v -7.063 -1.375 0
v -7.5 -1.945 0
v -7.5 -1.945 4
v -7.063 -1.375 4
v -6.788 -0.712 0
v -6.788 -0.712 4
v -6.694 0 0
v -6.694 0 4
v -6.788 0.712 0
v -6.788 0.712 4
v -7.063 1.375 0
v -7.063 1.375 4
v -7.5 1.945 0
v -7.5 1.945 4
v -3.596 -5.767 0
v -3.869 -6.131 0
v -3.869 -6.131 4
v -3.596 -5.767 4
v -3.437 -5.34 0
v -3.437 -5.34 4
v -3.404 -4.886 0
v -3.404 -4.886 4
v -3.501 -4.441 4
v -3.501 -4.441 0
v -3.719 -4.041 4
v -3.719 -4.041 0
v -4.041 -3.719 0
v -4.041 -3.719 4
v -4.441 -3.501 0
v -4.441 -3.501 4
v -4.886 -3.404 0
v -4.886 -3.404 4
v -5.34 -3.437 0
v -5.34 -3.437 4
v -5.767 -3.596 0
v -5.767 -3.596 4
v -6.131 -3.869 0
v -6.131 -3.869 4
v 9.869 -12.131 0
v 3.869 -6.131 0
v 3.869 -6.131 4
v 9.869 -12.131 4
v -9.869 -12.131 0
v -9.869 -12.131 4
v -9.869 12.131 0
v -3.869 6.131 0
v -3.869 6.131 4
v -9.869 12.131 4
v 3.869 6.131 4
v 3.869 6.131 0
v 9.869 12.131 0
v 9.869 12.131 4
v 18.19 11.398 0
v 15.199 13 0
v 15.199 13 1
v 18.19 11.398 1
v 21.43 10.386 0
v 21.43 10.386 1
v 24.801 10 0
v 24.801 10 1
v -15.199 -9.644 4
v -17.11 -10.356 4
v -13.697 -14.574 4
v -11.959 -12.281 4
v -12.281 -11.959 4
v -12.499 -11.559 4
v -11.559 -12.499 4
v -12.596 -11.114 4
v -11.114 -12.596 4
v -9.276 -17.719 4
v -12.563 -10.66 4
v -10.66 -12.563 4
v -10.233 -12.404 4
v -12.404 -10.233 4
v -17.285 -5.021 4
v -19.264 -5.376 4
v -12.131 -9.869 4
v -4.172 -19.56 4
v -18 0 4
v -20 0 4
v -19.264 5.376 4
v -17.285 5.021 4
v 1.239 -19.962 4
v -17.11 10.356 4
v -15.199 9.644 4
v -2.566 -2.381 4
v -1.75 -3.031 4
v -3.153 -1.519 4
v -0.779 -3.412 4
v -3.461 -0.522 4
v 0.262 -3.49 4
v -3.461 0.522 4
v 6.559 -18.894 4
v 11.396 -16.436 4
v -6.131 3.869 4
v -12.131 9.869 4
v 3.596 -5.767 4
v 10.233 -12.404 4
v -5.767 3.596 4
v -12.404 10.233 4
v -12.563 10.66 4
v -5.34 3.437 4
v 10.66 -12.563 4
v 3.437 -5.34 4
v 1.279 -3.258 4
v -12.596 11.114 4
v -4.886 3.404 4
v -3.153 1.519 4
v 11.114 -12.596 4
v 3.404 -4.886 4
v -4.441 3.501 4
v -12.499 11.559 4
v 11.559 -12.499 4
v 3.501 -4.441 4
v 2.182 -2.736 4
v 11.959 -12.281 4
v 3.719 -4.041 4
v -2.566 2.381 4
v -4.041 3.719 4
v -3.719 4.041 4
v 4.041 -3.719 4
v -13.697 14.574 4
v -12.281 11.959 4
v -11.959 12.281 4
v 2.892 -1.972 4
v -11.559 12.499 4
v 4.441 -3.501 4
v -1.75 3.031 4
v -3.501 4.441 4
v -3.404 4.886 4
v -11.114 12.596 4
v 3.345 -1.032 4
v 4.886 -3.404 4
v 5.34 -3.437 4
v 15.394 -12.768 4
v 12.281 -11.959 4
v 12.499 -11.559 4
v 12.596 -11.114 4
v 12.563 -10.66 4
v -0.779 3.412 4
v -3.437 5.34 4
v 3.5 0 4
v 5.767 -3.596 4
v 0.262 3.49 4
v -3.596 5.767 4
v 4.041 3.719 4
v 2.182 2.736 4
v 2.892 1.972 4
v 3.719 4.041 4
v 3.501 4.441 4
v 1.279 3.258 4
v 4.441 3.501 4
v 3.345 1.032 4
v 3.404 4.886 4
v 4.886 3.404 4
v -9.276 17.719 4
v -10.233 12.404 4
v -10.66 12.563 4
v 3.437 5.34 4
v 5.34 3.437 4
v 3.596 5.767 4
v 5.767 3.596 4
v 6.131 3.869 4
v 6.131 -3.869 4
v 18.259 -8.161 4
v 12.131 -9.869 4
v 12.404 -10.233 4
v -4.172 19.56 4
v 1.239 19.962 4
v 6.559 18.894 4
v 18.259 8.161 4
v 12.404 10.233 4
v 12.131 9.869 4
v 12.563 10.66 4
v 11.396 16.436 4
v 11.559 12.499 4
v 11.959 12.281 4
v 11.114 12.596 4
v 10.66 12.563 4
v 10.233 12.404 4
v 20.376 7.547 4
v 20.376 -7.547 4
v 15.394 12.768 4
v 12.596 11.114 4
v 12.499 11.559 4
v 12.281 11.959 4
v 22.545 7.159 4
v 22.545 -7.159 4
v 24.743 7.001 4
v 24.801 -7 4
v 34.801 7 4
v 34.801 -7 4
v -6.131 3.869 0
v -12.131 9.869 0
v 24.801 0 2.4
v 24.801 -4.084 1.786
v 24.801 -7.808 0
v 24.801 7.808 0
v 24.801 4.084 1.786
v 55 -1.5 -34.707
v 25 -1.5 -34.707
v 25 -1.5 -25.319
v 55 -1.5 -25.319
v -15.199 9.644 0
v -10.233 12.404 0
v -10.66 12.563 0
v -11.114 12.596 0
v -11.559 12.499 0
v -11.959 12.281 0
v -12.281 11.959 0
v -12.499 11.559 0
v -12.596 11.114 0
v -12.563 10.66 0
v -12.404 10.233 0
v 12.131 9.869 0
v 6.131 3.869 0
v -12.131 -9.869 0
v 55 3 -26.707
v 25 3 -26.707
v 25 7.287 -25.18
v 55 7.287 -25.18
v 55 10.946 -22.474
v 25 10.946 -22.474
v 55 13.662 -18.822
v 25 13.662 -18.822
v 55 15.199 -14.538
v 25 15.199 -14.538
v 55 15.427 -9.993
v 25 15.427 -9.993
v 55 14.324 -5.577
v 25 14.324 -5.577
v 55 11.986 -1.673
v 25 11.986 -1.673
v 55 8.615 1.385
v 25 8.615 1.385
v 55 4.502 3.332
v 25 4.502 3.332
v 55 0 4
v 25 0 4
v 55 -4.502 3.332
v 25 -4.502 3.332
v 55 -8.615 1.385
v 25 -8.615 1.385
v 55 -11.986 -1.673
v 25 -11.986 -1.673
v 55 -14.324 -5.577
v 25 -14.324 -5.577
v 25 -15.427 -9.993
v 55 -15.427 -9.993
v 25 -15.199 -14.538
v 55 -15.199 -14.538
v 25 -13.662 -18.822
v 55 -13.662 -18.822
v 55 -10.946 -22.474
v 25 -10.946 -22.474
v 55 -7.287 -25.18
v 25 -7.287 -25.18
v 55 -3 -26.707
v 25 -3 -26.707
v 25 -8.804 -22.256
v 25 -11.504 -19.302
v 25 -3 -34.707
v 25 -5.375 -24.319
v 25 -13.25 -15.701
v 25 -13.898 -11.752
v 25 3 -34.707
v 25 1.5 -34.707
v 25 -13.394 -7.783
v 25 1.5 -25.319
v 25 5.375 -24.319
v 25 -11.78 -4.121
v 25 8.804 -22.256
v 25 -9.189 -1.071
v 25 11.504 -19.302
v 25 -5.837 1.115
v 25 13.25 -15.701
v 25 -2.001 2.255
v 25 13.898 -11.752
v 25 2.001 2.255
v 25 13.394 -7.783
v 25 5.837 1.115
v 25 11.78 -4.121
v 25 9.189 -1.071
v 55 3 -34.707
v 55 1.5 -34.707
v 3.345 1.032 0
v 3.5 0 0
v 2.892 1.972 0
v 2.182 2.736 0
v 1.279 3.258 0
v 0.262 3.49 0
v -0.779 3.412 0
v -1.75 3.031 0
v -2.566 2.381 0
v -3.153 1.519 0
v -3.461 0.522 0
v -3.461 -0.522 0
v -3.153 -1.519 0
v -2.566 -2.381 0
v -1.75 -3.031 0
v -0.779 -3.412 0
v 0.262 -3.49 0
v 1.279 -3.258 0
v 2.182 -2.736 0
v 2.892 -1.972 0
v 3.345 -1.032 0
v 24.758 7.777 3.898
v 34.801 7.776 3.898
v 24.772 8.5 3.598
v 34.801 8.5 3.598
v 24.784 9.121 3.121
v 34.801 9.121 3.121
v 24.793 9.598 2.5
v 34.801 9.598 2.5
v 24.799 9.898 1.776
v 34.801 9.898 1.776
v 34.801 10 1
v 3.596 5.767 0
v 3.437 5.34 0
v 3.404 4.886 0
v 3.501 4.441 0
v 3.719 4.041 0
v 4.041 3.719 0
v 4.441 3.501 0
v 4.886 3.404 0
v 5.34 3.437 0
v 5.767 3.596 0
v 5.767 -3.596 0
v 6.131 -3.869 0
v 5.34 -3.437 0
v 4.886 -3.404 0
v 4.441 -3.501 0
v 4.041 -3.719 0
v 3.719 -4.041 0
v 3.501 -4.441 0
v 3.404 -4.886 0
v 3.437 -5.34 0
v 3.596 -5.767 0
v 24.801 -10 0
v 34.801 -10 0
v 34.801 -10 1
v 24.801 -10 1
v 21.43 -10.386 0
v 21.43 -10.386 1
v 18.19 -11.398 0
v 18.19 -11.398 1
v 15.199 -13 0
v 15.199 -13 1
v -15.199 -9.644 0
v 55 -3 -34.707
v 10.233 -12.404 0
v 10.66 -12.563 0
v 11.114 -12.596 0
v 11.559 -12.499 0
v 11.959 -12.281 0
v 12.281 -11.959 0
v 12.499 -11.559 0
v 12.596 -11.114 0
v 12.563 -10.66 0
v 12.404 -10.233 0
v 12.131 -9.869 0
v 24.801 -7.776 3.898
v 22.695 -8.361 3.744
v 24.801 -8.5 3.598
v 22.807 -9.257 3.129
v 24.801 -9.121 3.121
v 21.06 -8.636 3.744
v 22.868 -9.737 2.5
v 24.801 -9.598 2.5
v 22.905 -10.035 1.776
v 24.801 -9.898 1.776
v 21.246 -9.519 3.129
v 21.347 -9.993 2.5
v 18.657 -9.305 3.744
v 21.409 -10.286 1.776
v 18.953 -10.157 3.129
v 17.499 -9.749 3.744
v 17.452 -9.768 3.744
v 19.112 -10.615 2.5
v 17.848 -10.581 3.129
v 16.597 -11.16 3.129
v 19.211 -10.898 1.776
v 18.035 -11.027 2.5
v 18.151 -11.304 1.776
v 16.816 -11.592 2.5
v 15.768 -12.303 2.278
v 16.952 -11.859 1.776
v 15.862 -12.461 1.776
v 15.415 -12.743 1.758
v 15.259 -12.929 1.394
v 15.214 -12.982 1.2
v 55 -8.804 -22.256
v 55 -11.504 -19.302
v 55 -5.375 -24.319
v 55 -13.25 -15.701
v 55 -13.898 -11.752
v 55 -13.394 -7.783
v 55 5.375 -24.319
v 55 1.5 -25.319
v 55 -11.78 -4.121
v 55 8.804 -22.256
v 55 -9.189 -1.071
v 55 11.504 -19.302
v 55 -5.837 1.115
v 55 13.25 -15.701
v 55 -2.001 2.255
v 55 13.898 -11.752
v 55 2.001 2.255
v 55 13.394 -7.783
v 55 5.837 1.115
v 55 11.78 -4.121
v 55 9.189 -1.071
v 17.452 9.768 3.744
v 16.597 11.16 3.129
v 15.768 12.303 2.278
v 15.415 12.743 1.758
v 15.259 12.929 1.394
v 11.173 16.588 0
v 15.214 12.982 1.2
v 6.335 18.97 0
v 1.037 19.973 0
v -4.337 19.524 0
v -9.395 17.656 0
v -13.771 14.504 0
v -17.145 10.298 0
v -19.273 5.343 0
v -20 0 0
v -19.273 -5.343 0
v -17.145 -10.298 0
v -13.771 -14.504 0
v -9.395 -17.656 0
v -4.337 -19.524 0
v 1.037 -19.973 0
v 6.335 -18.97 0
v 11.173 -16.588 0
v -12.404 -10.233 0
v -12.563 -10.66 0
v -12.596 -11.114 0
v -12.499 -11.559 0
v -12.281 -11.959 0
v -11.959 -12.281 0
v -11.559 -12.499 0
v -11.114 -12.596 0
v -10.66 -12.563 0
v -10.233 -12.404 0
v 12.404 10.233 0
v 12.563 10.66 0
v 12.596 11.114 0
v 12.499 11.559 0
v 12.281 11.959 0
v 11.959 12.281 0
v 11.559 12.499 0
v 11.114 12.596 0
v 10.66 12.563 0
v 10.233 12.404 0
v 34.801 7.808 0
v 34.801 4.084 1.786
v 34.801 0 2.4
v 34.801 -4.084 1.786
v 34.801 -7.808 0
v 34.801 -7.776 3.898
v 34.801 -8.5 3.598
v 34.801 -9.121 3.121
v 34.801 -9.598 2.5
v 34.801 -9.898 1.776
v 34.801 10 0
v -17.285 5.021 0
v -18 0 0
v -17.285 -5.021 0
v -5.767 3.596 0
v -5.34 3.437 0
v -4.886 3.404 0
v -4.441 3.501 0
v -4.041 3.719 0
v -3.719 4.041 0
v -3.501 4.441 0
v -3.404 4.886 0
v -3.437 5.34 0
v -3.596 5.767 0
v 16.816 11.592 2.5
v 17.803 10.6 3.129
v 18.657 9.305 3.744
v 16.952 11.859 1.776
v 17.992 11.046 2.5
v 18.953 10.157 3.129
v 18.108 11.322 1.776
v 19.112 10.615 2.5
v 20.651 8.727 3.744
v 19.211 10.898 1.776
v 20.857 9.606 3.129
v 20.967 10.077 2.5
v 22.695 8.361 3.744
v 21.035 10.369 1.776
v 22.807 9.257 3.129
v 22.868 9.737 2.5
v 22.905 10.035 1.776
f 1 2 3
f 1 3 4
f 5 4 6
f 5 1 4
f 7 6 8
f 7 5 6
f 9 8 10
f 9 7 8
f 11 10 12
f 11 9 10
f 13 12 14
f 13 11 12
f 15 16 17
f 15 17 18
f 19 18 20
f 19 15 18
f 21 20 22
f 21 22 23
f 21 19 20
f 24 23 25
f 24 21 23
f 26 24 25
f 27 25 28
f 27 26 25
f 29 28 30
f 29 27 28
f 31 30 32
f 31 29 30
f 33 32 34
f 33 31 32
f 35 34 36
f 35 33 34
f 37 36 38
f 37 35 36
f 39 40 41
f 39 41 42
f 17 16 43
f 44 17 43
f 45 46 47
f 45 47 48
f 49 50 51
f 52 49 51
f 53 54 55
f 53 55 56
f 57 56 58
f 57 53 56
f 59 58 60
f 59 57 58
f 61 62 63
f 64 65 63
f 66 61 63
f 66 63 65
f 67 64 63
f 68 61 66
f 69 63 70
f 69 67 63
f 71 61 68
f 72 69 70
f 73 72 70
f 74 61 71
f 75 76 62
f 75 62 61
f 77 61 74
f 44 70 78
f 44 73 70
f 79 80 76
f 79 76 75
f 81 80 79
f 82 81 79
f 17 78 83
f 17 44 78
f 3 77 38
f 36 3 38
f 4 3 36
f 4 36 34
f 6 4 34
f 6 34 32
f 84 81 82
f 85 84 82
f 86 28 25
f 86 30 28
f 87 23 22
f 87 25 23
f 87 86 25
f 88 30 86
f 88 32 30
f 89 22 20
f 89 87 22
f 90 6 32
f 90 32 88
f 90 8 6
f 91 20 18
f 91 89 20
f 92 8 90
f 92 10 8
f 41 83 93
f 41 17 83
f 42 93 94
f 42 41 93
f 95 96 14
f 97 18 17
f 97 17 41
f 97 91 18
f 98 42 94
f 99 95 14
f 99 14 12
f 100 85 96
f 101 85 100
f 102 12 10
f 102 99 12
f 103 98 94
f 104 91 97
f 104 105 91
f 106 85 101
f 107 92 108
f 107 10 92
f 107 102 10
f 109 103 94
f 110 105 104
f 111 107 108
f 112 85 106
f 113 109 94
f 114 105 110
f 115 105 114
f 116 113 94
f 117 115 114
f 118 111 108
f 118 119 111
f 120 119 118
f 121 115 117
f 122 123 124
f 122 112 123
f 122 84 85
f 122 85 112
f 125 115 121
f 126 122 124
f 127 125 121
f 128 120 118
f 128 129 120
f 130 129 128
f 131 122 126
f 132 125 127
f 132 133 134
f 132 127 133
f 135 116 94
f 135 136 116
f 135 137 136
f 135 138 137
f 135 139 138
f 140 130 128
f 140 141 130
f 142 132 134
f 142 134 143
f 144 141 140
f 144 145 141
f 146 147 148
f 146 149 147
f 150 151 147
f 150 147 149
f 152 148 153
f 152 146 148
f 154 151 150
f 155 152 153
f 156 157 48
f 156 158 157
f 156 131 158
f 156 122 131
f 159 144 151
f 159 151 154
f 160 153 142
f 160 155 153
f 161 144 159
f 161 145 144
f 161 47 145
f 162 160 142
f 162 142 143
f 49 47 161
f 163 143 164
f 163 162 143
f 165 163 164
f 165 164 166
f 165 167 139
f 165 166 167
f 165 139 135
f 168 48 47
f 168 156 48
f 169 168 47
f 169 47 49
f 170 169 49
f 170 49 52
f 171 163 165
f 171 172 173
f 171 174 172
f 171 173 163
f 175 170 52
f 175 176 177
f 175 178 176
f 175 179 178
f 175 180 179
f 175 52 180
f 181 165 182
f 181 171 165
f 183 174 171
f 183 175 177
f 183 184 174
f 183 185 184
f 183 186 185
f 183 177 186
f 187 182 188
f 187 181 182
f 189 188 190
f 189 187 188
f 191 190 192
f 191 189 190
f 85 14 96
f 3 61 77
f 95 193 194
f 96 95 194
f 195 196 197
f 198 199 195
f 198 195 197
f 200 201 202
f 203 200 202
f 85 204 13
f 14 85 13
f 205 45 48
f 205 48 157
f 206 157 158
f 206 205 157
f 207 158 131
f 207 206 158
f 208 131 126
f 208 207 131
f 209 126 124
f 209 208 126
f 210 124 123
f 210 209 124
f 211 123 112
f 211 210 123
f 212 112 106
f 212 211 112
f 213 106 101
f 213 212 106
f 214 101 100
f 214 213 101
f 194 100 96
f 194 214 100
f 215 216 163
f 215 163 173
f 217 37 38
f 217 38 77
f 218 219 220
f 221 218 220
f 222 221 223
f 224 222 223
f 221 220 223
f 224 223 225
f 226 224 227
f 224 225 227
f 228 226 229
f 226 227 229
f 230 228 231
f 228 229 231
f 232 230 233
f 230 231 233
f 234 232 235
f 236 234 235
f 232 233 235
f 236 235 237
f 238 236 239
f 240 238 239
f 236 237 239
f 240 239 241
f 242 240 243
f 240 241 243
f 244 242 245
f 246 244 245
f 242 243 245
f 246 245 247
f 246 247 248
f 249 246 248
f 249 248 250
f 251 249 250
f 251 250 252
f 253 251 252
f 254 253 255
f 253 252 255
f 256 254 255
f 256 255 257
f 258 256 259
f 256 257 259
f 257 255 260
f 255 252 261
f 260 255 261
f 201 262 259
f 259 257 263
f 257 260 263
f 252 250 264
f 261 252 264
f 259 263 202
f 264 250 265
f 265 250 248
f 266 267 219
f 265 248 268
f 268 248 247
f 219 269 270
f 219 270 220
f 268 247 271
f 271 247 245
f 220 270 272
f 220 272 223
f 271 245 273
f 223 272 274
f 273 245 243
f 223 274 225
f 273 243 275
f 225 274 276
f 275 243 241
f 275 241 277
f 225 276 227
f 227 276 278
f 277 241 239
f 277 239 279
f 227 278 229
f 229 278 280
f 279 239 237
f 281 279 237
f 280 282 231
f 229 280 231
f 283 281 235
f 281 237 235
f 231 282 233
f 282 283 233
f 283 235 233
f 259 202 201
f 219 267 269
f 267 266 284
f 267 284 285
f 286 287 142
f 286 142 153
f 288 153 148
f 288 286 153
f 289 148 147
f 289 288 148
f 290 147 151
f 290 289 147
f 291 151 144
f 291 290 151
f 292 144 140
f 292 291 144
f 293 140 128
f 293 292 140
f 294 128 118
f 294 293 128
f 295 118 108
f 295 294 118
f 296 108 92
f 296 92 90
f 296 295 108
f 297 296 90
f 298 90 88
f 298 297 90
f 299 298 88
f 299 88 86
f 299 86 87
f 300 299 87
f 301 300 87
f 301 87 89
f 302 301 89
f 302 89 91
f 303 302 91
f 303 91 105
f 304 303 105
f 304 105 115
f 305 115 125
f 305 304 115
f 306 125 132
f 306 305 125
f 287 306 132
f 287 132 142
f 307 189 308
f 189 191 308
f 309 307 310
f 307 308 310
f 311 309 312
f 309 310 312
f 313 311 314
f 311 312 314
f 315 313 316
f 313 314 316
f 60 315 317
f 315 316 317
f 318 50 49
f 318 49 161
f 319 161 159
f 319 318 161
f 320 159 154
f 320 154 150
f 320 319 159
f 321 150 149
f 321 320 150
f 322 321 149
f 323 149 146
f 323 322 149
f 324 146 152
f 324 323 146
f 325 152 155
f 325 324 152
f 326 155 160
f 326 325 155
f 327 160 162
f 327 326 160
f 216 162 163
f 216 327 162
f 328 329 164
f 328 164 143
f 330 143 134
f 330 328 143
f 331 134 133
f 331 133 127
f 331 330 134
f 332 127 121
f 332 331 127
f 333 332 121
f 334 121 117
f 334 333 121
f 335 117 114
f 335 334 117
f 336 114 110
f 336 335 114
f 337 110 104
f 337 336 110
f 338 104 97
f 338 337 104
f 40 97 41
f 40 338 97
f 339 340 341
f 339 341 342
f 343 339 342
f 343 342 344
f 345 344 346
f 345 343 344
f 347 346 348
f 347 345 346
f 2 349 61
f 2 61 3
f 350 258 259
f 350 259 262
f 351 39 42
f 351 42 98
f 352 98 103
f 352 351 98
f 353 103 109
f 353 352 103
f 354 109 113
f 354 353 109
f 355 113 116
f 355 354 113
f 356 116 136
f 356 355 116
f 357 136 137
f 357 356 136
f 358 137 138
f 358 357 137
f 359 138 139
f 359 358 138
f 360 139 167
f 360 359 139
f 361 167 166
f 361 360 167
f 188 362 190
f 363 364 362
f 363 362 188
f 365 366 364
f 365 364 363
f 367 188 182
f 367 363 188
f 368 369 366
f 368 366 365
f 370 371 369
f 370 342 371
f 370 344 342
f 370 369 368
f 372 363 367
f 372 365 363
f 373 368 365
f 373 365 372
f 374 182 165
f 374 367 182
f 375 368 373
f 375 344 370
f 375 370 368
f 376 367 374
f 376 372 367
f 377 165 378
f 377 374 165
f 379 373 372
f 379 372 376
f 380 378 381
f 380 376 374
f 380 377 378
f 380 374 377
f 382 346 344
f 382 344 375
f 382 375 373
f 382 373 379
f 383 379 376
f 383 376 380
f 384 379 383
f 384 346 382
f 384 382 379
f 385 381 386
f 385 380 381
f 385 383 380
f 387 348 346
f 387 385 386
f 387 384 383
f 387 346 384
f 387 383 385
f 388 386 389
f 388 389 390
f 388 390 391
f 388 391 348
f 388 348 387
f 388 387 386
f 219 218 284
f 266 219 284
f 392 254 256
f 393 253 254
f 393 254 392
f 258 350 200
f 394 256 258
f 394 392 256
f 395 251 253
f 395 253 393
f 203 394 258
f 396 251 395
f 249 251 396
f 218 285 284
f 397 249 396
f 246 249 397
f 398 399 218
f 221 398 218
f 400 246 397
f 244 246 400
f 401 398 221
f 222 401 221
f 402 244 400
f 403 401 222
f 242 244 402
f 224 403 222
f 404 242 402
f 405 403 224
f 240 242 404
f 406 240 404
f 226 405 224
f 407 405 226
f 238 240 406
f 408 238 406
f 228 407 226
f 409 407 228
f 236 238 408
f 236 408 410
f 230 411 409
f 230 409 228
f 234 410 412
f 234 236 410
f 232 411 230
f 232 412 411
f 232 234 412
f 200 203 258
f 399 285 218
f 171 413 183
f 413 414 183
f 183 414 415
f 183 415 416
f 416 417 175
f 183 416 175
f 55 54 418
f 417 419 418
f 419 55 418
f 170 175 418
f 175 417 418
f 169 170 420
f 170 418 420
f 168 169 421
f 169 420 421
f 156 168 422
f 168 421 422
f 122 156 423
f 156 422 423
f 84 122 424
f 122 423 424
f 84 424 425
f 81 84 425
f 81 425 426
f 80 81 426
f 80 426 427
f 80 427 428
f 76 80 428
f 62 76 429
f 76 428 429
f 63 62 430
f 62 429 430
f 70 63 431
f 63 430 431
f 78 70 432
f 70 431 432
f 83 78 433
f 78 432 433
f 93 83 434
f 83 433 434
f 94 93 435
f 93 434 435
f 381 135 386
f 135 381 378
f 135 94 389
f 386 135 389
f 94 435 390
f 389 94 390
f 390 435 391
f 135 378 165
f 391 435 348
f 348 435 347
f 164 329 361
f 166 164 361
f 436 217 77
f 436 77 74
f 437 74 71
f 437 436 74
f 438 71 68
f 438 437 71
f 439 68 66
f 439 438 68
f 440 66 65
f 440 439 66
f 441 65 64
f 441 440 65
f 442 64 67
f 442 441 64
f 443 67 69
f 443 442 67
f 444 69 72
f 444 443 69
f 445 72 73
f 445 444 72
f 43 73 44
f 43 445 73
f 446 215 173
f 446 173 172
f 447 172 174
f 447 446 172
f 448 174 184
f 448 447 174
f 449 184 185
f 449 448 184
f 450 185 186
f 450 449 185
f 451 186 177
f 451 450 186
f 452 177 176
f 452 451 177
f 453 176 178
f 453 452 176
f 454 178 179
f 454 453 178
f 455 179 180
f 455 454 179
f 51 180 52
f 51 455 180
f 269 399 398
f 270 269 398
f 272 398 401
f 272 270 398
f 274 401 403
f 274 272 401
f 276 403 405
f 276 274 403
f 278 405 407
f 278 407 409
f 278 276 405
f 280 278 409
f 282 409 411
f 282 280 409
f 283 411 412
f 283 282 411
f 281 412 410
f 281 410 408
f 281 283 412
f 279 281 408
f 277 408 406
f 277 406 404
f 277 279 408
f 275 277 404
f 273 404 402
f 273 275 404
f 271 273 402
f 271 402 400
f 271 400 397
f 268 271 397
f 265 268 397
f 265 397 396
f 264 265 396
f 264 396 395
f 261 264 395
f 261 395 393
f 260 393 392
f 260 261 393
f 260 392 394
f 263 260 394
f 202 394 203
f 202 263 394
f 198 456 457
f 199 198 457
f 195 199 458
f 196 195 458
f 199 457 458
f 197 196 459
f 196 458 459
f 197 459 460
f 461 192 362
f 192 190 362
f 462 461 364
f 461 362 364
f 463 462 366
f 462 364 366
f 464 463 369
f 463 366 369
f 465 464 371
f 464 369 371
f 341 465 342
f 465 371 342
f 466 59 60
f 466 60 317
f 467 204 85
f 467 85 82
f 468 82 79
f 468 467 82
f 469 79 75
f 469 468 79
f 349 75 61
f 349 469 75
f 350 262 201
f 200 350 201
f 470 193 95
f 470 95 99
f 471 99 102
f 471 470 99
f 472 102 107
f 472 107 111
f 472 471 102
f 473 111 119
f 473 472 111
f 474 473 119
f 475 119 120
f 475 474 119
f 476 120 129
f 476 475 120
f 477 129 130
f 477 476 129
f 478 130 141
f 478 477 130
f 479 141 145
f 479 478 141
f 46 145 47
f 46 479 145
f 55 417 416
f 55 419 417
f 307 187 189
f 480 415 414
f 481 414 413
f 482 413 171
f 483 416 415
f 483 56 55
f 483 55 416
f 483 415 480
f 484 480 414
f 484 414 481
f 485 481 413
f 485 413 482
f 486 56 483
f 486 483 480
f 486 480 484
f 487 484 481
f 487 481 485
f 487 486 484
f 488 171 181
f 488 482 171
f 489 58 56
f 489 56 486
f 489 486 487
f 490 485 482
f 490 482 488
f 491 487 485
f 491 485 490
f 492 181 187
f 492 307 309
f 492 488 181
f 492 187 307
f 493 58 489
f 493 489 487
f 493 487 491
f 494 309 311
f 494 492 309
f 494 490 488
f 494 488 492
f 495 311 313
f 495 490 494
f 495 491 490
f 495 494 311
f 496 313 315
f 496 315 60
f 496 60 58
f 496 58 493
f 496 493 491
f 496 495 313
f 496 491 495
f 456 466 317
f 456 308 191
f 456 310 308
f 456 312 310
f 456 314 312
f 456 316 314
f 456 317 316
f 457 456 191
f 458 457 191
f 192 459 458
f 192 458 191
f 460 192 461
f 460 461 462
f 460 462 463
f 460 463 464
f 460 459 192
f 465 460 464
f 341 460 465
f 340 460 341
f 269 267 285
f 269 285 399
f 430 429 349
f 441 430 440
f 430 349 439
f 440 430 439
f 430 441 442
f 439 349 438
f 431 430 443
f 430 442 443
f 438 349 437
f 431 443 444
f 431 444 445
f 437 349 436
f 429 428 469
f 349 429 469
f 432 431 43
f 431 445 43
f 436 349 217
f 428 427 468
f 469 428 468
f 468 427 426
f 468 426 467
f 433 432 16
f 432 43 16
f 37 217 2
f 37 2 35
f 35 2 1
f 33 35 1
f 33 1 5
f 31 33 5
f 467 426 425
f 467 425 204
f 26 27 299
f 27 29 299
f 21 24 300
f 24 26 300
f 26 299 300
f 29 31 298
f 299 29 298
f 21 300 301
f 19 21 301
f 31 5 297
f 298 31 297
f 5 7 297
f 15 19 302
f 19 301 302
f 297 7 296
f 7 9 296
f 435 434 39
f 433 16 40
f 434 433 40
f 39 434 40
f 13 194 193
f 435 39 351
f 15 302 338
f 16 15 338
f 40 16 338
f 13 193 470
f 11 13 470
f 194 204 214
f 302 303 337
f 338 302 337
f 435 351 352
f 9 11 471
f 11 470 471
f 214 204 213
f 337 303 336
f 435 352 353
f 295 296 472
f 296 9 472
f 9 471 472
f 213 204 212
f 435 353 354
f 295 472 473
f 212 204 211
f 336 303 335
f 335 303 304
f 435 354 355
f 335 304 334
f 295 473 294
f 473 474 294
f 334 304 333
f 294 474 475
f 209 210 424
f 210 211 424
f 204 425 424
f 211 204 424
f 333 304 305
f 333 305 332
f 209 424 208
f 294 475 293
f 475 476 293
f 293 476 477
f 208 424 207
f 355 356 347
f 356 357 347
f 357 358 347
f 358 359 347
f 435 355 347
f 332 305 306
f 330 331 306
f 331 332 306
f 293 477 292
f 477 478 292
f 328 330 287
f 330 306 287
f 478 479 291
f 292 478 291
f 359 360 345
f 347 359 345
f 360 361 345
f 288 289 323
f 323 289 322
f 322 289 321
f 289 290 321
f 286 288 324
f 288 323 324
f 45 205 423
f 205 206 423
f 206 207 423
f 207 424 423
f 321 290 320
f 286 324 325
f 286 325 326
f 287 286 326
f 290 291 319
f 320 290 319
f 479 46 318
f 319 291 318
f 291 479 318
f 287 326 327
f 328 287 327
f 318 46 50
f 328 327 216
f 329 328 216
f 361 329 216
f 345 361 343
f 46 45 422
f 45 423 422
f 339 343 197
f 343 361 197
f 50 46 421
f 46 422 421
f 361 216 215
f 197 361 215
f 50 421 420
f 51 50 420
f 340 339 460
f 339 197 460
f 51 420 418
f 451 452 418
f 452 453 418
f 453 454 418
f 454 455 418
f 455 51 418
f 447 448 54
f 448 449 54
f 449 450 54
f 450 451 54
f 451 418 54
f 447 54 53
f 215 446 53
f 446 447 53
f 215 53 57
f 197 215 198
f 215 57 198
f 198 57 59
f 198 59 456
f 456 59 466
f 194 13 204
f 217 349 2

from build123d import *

# Parameters (mm, degrees)
EXTRUDE002_DEPTH = 30
EXTRUDE003_DEPTH = 10
SKETCH_R         = 3.5
EXTRUDE_DEPTH    = 4
FILLET_R         = 3


with BuildPart() as bracket_cylinder:
    # Sketch001 → Extrude002 (new body)
    with BuildSketch(Plane.YZ.offset(25)):
        with BuildLine():
            ThreePointArc((3, -26.706906), (0, 4), (-3, -26.706906))
            Line((-3, -26.706906), (-3, -34.706906))
            Line((-3, -34.706906), (-1.5, -34.706906))
            Line((-1.5, -34.706906), (-1.5, -25.318828))
            ThreePointArc((1.5, -25.318828), (0, 2.4), (-1.5, -25.318828))
            Line((1.5, -34.706906), (1.5, -25.318828))
            Line((3, -34.706906), (1.5, -34.706906))
            Line((3, -26.706906), (3, -34.706906))
        make_face()
    extrude(amount=EXTRUDE002_DEPTH)


with BuildPart() as extrude003:
    # Sketch002 → Extrude003 (new body)
    with BuildSketch(Plane.YZ.offset(34.801316)):
        with BuildLine():
            ThreePointArc((9.396876, -1.257504), (0, 2.4), (-9.396876, -1.257504))
            Line((-9.396876, -1.257504), (9.396876, -1.257504))
        make_face()
    extrude(amount=-EXTRUDE003_DEPTH)


with BuildPart() as fillet_body:
    # Sketch → Extrude (new body)
    with BuildSketch(Plane.XY):
        with BuildLine():
            ThreePointArc((15.198684, 13), (-20, 0), (15.198684, -13))
            ThreePointArc((24.801316, -10), (19.786149, -10.815491), (15.198684, -13))
            Line((34.801316, -10), (24.801316, -10))
            Line((34.801316, 10), (34.801316, -10))
            Line((24.801316, 10), (34.801316, 10))
            ThreePointArc((15.198684, 13), (19.786149, 10.815491), (24.801316, 10))
        make_face()
        Circle(SKETCH_R, mode=Mode.SUBTRACT)
        with BuildLine():
            ThreePointArc((3.868629, 6.131371), (3.868629, 3.868629), (6.131371, 3.868629))
            Line((6.131371, 3.868629), (12.131371, 9.868629))
            ThreePointArc((12.131371, 9.868629), (12.131371, 12.131371), (9.868629, 12.131371))
            Line((3.868629, 6.131371), (9.868629, 12.131371))
        make_face(mode=Mode.SUBTRACT)
        with BuildLine():
            ThreePointArc((-6.131371, 3.868629), (-3.868629, 3.868629), (-3.868629, 6.131371))
            Line((-3.868629, 6.131371), (-9.868629, 12.131371))
            ThreePointArc((-9.868629, 12.131371), (-12.131371, 12.131371), (-12.131371, 9.868629))
            Line((-6.131371, 3.868629), (-12.131371, 9.868629))
        make_face(mode=Mode.SUBTRACT)
        with BuildLine():
            ThreePointArc((-3.868629, -6.131371), (-3.868629, -3.868629), (-6.131371, -3.868629))
            Line((-6.131371, -3.868629), (-12.131371, -9.868629))
            ThreePointArc((-12.131371, -9.868629), (-12.131371, -12.131371), (-9.868629, -12.131371))
            Line((-3.868629, -6.131371), (-9.868629, -12.131371))
        make_face(mode=Mode.SUBTRACT)
        with BuildLine():
            ThreePointArc((6.131371, -3.868629), (3.868629, -3.868629), (3.868629, -6.131371))
            Line((3.868629, -6.131371), (9.868629, -12.131371))
            ThreePointArc((9.868629, -12.131371), (12.131371, -12.131371), (12.131371, -9.868629))
            Line((6.131371, -3.868629), (12.131371, -9.868629))
        make_face(mode=Mode.SUBTRACT)
        with BuildLine():
            Line((-15.198684, 9.643651), (-7.5, 1.944967))
            ThreePointArc((-7.5, -1.944967), (-6.694368, 0), (-7.5, 1.944967))
            Line((-15.198684, -9.643651), (-7.5, -1.944967))
            ThreePointArc((-15.198684, 9.643651), (-18, 0), (-15.198684, -9.643651))
        make_face(mode=Mode.SUBTRACT)
    extrude(amount=EXTRUDE_DEPTH)

    # Cut: cut Extrude003
    add(extrude003.part, mode=Mode.SUBTRACT)

    # Fillet
    fillet_edges = [fillet_body.edges().sort_by_distance(p)[0] for p in [
        (29.801316, -10, 4),
        (29.801316, 10, 4),
    ]]
    fillet(fillet_edges, radius=FILLET_R)


solid = Compound([bracket_cylinder.part, fillet_body.part])
